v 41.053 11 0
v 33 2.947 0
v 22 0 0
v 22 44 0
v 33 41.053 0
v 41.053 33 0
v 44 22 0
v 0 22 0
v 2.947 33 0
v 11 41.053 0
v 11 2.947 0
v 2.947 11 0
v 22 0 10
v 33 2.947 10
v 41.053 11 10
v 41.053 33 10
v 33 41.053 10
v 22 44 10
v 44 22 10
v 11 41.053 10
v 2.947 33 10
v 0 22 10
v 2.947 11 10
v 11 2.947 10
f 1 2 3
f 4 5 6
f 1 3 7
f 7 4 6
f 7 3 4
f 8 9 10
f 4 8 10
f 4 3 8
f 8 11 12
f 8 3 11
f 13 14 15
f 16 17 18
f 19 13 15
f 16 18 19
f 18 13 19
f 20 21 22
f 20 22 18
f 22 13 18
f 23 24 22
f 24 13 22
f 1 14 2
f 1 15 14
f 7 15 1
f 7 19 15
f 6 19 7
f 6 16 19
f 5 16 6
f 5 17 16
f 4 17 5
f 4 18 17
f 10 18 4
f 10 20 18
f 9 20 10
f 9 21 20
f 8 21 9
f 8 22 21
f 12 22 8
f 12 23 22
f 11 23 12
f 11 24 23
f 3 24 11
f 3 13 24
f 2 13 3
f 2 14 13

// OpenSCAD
$fn = 32;

// ----------------------------------------------------------------------
// Eccentric disc: egg, 10 mm thick
// ----------------------------------------------------------------------

// --- parameters (mm) ---
profile_height = 10;      // extrusion height
profile_points = 12;      // points of the closed outline

profile = [[0, 22], [2.947, 11], [11, 2.947], [22, 0], [33, 2.947], [41.053, 11], [44, 22], [41.053, 33], [33, 41.053], [22, 44], [11, 41.053], [2.947, 33]];  // single closed polygon, 12 points, counter clockwise

// --- the one profile operation ---
linear_extrude(height = profile_height) polygon(points = profile);
